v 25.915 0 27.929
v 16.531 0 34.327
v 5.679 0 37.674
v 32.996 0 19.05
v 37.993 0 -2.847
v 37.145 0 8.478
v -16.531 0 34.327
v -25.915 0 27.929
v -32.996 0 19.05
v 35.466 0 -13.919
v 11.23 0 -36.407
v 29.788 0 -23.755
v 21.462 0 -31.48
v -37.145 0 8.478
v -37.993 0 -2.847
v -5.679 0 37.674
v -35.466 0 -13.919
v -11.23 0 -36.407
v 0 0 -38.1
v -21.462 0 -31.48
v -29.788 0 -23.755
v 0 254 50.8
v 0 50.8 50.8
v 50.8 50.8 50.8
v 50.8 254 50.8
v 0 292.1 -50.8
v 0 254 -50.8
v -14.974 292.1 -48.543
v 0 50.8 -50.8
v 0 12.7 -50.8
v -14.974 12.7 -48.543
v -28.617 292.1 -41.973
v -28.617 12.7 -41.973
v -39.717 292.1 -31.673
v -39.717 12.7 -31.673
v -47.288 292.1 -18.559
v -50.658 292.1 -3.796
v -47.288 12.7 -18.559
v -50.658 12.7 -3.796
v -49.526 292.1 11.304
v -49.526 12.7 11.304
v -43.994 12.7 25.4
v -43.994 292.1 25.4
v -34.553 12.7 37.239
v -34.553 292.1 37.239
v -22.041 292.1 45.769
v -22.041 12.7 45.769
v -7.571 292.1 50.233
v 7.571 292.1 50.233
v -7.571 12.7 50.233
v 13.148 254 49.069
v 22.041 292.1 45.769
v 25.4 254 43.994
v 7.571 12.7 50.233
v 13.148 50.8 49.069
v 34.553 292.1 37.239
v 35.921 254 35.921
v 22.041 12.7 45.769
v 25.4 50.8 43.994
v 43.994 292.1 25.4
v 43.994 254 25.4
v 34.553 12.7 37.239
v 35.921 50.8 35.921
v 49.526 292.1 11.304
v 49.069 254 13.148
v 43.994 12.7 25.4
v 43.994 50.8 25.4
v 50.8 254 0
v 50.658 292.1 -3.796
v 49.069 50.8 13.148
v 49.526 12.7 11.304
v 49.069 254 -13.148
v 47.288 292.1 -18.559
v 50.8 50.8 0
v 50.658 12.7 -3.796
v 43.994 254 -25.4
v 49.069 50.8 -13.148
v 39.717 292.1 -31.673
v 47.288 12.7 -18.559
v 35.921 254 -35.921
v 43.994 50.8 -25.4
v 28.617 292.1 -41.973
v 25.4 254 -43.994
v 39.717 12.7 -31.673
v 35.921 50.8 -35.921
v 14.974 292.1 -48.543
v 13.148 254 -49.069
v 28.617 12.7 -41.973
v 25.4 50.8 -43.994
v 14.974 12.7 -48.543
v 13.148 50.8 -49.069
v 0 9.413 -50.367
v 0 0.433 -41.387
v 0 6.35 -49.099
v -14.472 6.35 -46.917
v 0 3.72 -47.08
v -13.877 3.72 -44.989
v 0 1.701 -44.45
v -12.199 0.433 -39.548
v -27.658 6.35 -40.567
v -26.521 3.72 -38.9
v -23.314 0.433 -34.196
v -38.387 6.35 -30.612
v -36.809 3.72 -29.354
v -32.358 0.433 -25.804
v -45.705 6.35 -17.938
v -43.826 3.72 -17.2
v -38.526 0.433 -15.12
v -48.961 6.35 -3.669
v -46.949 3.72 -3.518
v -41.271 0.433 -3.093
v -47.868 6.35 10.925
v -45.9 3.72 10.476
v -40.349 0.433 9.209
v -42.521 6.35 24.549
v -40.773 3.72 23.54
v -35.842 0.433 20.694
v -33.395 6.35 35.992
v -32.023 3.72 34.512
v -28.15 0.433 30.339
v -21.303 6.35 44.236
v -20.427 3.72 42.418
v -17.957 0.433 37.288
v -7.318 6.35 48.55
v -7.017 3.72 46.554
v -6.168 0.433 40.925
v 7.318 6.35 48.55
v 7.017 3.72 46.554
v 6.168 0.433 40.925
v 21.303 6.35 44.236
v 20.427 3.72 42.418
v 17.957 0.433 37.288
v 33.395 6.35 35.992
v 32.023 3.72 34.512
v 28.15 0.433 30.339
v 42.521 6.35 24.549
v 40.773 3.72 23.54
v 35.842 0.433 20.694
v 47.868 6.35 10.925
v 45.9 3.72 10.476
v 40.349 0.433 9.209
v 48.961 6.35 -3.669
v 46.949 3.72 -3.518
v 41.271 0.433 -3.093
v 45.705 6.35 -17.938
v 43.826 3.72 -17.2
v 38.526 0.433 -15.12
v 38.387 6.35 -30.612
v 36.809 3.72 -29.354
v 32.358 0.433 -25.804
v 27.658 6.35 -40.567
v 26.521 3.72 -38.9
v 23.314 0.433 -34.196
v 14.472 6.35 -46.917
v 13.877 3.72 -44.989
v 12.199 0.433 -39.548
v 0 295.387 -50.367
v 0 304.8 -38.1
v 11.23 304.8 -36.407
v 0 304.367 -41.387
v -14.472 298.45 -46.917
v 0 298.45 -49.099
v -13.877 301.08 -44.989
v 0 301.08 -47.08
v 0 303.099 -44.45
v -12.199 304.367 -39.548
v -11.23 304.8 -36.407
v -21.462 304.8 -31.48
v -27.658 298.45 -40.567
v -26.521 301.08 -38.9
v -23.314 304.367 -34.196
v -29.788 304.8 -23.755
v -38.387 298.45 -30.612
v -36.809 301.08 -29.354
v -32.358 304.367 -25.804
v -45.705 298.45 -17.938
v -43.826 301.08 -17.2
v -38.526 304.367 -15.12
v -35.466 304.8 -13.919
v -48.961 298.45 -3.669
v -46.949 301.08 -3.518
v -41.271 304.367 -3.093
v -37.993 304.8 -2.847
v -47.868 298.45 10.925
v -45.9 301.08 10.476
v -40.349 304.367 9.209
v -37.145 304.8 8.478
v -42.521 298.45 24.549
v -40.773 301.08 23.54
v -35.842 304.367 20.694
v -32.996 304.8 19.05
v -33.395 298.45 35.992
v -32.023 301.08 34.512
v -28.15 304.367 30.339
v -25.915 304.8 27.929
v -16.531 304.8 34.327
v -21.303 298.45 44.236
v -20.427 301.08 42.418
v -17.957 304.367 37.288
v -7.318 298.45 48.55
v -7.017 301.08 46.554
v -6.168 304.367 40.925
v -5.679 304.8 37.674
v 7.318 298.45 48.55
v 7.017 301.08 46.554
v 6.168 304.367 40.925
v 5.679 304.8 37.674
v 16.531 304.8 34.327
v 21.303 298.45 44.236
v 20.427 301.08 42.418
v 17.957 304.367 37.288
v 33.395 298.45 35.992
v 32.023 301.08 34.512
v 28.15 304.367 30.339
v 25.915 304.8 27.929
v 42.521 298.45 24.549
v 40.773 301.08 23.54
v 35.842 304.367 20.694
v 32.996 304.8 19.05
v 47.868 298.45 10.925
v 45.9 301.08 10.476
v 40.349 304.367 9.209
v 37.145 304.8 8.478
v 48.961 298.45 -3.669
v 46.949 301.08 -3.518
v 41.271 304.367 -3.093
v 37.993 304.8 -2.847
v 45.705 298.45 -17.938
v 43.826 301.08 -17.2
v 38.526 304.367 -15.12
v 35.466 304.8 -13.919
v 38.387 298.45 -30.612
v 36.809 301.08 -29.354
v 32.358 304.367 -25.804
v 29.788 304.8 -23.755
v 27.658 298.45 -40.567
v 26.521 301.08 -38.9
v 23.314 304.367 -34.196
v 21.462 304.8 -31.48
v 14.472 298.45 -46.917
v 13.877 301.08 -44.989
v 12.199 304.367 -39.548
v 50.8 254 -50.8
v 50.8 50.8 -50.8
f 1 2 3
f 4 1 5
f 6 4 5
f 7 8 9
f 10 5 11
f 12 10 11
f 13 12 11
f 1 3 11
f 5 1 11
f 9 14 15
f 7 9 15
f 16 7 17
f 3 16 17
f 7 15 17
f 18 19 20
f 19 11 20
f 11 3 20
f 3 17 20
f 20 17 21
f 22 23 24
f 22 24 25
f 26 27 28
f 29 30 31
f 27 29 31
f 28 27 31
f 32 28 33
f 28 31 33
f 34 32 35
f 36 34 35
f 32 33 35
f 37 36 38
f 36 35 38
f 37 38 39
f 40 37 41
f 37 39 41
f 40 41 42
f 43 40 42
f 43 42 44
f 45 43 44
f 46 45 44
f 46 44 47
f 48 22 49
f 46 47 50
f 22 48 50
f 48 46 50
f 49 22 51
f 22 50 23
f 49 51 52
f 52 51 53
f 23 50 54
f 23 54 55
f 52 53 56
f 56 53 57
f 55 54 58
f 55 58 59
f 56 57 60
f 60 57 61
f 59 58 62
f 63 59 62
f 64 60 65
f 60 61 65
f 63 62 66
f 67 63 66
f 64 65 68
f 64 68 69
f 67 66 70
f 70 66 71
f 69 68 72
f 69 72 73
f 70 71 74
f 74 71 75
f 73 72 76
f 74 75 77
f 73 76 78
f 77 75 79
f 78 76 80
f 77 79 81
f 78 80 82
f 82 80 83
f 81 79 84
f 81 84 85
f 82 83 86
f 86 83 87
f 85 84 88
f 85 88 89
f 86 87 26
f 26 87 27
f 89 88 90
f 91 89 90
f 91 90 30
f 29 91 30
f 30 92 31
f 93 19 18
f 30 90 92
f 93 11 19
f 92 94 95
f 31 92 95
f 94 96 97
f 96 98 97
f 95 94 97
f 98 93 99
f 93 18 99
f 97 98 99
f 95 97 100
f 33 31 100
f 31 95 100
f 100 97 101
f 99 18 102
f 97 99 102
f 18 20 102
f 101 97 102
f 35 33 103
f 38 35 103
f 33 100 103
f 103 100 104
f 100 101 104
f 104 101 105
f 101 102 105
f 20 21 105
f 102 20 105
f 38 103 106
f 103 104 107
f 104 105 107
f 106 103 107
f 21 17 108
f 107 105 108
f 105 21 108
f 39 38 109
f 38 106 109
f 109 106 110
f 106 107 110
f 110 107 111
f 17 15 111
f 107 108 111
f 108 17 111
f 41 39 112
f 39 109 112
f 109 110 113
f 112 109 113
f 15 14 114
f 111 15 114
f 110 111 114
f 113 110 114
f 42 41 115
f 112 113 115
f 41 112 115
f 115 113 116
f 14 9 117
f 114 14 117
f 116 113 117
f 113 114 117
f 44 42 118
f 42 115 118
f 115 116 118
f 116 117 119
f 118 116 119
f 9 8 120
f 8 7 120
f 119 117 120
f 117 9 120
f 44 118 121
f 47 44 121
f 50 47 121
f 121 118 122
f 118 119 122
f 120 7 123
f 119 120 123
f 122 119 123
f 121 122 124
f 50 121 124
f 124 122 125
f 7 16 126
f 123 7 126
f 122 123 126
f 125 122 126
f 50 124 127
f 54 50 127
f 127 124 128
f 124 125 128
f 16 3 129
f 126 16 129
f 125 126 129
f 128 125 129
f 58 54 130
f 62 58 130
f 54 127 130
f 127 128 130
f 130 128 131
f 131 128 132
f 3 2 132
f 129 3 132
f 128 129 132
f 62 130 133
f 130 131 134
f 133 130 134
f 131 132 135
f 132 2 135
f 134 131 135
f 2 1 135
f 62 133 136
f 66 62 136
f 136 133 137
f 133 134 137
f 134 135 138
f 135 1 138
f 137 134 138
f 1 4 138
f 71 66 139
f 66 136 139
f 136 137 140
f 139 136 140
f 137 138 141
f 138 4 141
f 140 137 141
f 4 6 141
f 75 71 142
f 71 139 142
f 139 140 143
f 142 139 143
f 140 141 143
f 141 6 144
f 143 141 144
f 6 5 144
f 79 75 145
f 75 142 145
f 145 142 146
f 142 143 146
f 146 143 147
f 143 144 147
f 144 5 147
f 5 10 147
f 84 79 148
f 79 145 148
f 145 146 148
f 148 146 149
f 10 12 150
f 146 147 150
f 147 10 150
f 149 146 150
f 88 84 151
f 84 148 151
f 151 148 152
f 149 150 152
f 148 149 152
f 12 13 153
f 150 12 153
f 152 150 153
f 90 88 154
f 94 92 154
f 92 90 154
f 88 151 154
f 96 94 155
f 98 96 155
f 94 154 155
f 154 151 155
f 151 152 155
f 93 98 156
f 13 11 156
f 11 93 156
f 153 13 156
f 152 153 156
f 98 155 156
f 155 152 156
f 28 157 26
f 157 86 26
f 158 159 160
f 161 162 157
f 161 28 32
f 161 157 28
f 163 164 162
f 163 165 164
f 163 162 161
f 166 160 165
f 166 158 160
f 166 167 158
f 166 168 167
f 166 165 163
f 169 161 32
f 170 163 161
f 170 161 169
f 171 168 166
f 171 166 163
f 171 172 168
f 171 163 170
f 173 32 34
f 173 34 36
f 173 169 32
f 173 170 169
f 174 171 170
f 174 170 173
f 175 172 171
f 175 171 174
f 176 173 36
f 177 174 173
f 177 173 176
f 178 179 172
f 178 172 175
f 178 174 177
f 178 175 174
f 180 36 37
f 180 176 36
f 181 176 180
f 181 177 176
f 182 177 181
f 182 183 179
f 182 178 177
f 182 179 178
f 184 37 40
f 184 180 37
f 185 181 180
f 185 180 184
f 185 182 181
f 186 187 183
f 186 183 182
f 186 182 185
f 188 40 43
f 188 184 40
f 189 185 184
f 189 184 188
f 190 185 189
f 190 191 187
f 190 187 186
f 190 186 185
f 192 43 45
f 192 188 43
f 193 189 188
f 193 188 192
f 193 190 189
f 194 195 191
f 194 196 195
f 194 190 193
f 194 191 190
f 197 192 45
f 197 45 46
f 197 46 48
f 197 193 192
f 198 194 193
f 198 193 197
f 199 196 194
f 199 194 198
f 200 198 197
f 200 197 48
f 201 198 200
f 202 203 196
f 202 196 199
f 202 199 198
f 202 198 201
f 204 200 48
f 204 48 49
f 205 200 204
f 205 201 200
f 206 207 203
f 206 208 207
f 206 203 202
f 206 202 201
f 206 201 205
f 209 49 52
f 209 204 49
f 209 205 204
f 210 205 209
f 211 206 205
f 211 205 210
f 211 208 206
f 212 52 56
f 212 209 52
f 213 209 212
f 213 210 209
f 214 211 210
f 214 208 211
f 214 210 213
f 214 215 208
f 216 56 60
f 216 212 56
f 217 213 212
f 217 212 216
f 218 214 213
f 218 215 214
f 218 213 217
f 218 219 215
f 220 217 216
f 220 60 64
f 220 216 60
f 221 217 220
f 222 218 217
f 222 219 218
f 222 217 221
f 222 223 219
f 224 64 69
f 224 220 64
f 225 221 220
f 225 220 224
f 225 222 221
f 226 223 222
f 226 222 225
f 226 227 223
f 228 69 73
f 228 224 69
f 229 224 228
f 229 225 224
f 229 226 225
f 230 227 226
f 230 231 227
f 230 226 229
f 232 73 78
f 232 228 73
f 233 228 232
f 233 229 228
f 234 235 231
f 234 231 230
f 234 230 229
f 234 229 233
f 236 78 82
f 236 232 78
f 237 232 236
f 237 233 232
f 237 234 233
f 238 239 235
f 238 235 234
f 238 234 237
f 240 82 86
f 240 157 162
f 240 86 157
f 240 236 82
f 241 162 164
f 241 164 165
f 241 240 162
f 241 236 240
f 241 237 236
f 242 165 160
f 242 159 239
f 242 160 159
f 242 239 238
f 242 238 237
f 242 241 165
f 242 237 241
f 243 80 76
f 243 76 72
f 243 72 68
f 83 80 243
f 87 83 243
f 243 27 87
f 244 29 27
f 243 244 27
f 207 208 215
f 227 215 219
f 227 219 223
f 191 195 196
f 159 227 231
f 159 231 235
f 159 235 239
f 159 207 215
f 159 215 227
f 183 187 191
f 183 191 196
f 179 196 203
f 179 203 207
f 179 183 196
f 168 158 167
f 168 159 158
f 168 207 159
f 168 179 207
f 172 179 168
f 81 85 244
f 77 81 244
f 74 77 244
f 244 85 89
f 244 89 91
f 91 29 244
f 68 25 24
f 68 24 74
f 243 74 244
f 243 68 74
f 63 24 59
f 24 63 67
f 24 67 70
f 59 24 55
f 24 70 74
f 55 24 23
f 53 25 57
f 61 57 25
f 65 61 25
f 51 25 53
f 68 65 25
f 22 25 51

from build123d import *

# Parameters (mm, degrees)
SKETCH1_R           = 50.8
BOSS_EXTRUDE1_DEPTH = 304.8
SKETCH2_W           = 101.6
SKETCH2_H           = 203.2
BOSS_EXTRUDE2_DEPTH = 50.8
FILLET1_R           = 12.7


with BuildPart() as part:
    # Sketch1 → Boss-Extrude1 (new body)
    with BuildSketch(Plane(origin=(0, 0, 0), x_dir=(1, 0, 0), z_dir=(0, 1, 0))):
        with Locations(Location((0, 0, 0), (0, 0, 90))):
            Circle(SKETCH1_R)
    extrude(amount=BOSS_EXTRUDE1_DEPTH)

    # Sketch2 → Boss-Extrude2 (add)
    with BuildSketch(Plane(origin=(0, 0, 0), x_dir=(0, 0, -1), z_dir=(1, 0, 0))):
        with Locations((0, 152.4)):
            Rectangle(SKETCH2_W, SKETCH2_H)
    extrude(amount=BOSS_EXTRUDE2_DEPTH)

    # Fillet1
    fillet1_edges = [part.edges().sort_by_distance(p)[0] for p in [
        (0, 0, 50.8),
        (0, 304.8, 50.8),
    ]]
    fillet(fillet1_edges, radius=FILLET1_R)


solid = part.part
